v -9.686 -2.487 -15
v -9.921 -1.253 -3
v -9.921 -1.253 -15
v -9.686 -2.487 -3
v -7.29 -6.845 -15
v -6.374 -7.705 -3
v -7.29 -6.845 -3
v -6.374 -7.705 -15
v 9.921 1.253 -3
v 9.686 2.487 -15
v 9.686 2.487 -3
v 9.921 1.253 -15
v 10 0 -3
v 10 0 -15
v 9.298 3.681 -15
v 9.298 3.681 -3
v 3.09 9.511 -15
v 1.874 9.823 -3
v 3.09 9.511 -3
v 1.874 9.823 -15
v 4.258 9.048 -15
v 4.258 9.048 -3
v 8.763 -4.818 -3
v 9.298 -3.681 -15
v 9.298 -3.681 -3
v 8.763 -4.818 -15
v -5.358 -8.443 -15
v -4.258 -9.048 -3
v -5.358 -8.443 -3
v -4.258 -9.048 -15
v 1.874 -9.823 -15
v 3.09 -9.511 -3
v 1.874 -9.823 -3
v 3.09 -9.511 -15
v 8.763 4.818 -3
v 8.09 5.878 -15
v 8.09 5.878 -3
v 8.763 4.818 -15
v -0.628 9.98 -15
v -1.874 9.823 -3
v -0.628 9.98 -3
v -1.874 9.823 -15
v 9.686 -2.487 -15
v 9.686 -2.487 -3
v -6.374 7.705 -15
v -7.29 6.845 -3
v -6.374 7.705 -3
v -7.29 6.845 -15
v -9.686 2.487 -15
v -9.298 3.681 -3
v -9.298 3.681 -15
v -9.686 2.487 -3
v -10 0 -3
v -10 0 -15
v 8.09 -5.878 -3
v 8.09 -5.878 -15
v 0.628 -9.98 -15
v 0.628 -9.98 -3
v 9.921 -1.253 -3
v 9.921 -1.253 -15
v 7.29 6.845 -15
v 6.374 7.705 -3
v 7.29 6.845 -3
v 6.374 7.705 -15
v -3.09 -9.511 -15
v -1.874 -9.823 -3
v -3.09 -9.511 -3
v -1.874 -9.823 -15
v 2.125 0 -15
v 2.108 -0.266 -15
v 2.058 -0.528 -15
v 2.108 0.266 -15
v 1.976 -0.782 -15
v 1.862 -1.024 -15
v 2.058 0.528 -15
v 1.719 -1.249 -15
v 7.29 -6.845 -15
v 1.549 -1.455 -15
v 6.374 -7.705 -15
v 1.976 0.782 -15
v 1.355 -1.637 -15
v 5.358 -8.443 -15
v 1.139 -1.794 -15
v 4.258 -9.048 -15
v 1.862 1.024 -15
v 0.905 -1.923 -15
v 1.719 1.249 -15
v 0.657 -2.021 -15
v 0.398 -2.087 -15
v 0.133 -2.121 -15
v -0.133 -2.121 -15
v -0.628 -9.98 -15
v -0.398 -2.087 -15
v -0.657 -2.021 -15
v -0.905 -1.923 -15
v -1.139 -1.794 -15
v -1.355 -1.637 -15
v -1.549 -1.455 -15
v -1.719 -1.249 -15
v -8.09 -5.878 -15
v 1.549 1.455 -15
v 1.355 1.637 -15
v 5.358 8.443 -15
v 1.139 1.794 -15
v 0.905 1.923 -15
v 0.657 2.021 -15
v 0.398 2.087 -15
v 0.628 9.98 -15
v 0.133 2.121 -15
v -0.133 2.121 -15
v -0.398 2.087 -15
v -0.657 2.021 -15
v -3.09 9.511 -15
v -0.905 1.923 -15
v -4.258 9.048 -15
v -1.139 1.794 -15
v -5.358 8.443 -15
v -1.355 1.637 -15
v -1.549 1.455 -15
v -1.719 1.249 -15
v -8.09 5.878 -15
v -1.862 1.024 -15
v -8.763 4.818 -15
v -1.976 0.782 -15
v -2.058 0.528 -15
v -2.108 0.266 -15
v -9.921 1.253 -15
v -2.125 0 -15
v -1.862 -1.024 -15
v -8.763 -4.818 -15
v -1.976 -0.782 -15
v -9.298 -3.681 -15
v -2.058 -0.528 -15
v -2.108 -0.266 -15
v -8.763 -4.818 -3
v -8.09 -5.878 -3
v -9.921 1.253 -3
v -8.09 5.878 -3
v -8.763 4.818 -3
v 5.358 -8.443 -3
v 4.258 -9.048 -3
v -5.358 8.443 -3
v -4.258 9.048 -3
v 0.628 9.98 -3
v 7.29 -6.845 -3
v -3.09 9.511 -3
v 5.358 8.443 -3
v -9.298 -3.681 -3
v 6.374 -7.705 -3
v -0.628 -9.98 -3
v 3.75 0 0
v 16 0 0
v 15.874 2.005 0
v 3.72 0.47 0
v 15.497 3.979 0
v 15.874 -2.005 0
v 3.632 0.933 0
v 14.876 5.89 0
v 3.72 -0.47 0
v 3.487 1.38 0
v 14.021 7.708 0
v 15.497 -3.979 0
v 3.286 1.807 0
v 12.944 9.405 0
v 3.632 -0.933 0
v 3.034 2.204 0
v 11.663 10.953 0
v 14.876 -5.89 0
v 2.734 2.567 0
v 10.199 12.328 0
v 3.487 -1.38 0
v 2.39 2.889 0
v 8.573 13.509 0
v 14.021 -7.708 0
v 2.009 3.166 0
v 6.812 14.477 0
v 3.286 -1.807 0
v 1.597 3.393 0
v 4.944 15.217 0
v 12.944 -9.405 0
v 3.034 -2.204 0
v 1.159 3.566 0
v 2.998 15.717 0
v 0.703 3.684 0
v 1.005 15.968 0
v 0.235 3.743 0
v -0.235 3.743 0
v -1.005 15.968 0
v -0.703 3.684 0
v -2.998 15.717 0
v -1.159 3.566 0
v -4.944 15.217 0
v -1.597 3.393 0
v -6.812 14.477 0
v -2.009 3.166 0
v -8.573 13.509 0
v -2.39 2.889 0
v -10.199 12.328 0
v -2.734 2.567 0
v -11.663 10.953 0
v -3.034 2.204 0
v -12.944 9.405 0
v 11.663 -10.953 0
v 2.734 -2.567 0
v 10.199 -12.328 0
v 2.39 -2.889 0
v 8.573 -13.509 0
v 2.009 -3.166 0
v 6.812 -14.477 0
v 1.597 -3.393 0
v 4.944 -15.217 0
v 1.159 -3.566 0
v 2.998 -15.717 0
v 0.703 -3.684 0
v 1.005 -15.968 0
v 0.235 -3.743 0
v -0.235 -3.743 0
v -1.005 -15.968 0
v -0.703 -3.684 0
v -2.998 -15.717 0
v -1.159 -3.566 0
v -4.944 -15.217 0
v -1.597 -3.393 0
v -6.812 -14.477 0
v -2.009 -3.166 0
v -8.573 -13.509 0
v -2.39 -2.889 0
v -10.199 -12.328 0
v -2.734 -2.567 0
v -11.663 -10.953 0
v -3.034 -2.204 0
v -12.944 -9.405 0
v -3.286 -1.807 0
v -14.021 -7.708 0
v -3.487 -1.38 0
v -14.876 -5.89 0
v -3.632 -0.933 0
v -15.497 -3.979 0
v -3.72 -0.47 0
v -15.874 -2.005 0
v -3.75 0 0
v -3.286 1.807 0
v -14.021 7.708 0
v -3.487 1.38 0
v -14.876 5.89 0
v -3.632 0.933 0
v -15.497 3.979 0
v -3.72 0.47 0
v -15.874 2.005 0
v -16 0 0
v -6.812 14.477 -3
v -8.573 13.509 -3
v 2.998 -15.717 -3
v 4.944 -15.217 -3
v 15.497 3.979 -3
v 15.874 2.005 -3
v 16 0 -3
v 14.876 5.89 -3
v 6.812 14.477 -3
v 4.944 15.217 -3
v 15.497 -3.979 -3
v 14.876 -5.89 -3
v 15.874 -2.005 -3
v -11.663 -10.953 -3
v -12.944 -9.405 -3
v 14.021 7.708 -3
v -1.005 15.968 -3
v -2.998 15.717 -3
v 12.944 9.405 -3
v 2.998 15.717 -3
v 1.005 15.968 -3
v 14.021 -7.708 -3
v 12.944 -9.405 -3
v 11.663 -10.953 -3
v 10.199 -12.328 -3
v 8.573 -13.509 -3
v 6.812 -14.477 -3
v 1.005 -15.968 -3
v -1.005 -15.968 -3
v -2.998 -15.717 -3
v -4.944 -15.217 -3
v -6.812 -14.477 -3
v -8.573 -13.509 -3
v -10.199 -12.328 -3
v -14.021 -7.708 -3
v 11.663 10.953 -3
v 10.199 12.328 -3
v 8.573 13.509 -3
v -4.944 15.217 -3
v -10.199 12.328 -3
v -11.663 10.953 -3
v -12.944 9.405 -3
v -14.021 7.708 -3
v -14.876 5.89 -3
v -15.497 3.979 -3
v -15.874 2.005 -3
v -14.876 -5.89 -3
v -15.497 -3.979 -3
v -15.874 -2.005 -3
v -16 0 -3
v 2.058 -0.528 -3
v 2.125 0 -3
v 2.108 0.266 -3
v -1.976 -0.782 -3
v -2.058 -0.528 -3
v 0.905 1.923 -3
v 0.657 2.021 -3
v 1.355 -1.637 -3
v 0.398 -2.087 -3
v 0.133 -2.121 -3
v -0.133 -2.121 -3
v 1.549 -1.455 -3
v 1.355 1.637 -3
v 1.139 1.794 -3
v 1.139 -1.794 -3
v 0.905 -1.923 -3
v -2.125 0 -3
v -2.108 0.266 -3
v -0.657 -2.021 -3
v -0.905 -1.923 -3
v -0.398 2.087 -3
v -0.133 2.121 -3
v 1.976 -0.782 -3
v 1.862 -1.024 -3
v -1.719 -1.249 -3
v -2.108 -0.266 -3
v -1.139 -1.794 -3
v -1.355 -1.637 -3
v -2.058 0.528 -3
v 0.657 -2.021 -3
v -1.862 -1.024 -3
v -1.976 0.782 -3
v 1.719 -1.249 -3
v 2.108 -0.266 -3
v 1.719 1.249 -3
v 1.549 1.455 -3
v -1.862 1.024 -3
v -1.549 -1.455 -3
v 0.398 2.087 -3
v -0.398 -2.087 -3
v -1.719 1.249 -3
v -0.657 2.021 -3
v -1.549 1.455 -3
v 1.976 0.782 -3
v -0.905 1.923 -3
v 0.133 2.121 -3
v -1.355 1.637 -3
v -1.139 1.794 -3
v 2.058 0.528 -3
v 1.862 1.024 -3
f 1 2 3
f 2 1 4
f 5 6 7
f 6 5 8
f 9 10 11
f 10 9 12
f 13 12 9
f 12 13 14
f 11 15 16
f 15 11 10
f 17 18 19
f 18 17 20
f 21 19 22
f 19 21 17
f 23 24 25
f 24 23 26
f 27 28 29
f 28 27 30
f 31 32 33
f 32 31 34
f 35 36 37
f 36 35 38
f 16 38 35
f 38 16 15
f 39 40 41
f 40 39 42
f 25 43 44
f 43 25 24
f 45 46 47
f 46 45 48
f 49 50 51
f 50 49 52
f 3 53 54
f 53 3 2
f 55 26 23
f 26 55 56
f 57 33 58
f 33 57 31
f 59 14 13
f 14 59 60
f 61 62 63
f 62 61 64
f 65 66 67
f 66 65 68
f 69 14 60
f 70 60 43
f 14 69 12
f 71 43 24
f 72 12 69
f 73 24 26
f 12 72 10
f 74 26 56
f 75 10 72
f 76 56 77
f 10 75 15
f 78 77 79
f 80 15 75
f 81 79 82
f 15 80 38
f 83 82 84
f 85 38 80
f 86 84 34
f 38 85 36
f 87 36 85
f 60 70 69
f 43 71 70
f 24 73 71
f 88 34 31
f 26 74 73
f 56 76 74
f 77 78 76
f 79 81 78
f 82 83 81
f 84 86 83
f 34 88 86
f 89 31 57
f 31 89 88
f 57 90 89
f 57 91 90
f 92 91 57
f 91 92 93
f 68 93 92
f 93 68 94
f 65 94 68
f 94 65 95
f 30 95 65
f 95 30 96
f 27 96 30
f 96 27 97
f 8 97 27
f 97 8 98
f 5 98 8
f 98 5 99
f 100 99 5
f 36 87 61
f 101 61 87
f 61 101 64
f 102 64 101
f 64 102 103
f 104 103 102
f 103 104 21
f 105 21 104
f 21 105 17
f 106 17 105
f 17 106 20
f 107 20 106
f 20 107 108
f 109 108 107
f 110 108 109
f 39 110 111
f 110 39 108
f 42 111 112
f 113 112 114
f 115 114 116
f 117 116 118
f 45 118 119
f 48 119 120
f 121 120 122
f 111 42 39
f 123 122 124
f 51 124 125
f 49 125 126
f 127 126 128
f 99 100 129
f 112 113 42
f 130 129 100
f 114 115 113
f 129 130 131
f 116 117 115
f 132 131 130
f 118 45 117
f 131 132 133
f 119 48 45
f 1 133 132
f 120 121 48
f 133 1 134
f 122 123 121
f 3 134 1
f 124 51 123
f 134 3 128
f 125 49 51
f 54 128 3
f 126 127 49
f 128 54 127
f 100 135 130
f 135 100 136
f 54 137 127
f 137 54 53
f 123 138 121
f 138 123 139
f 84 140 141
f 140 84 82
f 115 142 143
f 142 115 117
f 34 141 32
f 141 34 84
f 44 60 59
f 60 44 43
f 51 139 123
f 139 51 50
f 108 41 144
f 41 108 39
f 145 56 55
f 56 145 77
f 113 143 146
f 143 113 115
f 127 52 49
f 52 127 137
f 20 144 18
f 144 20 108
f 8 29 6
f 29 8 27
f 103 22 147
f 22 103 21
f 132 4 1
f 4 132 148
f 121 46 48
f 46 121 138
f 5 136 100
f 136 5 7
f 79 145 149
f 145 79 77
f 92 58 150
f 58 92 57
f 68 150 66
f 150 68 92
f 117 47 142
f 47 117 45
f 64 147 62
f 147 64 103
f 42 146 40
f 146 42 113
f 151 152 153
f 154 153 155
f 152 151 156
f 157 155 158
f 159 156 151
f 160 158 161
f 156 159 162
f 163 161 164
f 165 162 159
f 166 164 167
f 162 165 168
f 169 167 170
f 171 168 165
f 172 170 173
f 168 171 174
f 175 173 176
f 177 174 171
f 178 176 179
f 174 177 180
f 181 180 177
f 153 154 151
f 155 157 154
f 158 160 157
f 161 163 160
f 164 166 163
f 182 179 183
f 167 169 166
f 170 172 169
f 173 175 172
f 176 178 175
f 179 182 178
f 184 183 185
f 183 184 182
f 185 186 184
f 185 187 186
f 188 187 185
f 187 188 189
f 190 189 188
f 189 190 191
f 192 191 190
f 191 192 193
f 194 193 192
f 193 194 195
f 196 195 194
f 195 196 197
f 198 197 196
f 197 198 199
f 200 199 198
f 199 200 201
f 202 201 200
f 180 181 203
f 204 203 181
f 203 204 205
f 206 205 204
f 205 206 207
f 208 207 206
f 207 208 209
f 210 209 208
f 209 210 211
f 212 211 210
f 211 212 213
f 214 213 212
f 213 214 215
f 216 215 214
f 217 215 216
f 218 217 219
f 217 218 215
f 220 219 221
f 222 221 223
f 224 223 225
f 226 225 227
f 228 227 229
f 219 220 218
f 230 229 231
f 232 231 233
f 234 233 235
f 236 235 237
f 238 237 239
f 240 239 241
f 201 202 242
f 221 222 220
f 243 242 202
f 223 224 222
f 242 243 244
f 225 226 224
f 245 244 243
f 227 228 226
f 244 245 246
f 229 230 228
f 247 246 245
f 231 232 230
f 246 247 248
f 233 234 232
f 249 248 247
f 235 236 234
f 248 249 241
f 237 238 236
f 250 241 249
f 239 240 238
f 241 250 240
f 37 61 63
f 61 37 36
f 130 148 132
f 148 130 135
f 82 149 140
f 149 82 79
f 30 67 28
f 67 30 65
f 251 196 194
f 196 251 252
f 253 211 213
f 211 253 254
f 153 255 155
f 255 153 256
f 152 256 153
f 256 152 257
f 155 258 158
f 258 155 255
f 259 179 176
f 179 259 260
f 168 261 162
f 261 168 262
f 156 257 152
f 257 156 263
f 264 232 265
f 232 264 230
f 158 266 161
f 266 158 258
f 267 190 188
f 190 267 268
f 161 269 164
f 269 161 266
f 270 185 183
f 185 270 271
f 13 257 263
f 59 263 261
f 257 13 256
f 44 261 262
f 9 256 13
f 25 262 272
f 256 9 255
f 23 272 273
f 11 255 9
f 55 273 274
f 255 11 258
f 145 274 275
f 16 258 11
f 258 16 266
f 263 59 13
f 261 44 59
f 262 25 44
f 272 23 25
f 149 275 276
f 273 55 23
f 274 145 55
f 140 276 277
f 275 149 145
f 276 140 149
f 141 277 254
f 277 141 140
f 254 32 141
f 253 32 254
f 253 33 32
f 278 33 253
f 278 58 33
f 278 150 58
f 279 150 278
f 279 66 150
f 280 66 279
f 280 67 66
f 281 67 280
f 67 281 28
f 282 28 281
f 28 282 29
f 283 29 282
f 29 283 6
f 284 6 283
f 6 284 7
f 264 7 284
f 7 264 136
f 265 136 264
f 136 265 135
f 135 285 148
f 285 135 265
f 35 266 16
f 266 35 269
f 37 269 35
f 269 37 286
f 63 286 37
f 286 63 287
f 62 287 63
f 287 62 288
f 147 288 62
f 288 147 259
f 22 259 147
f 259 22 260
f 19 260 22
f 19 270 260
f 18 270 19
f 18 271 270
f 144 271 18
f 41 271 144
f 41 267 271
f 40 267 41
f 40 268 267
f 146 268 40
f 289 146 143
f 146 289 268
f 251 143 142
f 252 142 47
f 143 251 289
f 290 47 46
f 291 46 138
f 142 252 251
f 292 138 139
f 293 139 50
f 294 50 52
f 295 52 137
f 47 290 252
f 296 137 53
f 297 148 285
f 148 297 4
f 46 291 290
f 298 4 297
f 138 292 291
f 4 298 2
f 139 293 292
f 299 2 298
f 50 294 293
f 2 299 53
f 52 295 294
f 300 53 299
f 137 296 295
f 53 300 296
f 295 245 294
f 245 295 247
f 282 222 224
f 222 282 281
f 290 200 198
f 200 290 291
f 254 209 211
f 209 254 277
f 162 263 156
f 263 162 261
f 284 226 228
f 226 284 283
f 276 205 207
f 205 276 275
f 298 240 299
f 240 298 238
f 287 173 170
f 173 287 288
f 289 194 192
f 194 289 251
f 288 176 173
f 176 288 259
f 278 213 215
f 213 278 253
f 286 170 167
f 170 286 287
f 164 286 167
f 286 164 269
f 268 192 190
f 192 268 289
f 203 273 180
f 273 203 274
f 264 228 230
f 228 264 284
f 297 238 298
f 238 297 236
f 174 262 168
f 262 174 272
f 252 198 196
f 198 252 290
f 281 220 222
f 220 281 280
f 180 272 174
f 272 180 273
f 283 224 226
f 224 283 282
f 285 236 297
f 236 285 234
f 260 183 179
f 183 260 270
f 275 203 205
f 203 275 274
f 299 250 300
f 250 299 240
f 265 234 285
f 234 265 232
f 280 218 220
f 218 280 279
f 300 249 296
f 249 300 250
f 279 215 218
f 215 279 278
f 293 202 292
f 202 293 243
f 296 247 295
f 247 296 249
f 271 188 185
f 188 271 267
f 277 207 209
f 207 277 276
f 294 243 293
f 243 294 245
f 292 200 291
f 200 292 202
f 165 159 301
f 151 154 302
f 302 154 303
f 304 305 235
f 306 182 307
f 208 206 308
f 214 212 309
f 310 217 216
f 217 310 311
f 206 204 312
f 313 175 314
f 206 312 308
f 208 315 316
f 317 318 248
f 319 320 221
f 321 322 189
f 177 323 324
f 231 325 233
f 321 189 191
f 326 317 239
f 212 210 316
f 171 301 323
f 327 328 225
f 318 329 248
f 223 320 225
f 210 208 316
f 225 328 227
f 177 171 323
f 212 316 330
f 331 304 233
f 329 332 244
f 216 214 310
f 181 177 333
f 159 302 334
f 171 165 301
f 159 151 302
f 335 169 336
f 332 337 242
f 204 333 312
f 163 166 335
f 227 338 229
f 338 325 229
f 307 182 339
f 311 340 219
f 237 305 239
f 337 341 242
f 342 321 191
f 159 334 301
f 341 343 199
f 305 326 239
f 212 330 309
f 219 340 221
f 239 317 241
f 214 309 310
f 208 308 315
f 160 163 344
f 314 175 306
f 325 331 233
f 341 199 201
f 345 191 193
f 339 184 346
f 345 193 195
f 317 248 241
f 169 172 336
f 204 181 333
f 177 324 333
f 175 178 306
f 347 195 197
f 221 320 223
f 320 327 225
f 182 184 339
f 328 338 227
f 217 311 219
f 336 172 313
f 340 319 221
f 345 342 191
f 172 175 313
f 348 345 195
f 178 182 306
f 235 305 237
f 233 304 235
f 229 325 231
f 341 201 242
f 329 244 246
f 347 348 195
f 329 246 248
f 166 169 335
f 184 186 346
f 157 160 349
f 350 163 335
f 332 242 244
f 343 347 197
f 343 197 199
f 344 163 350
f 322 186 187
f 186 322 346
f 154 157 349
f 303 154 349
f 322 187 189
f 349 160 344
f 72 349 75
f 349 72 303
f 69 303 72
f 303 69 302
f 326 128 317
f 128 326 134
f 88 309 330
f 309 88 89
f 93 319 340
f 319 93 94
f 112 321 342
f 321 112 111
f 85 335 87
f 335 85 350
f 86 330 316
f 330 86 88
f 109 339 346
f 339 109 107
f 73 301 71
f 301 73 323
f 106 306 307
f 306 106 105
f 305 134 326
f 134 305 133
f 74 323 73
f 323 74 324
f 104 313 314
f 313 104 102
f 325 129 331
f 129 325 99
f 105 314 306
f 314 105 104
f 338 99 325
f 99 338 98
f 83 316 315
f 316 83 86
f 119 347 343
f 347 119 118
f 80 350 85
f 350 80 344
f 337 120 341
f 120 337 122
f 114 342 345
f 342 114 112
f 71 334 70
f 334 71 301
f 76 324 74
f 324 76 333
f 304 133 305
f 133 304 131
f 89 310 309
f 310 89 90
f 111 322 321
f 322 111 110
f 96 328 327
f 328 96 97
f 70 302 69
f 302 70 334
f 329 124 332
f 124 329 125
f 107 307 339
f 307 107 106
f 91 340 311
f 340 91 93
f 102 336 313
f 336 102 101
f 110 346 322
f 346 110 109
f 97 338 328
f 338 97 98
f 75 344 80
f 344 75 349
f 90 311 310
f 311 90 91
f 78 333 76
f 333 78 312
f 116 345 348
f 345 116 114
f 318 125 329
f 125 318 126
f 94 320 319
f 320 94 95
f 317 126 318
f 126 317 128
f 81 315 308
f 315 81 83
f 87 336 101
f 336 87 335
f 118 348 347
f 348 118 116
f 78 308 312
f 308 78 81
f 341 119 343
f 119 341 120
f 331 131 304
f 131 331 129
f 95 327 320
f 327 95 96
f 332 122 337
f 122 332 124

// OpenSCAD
$fn = 50;


difference() {
	union() {
		translate(v = [0, 0, -15.0000000000]) {
			cylinder(h = 15, r = 10.0000000000);
		}
		translate(v = [0, 0, -3.0000000000]) {
			cylinder(h = 3, r = 16.0000000000);
		}
	}
	union() {
		translate(v = [0, 0, 0]) {
			rotate(a = [0, 0, 0]) {
				difference() {
					union() {
						#translate(v = [0, 0, -15.0000000000]) {
							cylinder(h = 15, r = 2.0000000000);
						}
						#translate(v = [0, 0, -3]) {
							cylinder(h = 3, r = 10.0000000000, r1 = 2.1250000000, r2 = 3.7500000000);
						}
						#translate(v = [0, 0, -15.0000000000]) {
							cylinder(h = 15, r = 2.1250000000);
						}
						#translate(v = [0, 0, -15.0000000000]) {
							cylinder(h = 15, r = 2.0000000000);
						}
					}
					union();
				}
			}
		}
	}
}
